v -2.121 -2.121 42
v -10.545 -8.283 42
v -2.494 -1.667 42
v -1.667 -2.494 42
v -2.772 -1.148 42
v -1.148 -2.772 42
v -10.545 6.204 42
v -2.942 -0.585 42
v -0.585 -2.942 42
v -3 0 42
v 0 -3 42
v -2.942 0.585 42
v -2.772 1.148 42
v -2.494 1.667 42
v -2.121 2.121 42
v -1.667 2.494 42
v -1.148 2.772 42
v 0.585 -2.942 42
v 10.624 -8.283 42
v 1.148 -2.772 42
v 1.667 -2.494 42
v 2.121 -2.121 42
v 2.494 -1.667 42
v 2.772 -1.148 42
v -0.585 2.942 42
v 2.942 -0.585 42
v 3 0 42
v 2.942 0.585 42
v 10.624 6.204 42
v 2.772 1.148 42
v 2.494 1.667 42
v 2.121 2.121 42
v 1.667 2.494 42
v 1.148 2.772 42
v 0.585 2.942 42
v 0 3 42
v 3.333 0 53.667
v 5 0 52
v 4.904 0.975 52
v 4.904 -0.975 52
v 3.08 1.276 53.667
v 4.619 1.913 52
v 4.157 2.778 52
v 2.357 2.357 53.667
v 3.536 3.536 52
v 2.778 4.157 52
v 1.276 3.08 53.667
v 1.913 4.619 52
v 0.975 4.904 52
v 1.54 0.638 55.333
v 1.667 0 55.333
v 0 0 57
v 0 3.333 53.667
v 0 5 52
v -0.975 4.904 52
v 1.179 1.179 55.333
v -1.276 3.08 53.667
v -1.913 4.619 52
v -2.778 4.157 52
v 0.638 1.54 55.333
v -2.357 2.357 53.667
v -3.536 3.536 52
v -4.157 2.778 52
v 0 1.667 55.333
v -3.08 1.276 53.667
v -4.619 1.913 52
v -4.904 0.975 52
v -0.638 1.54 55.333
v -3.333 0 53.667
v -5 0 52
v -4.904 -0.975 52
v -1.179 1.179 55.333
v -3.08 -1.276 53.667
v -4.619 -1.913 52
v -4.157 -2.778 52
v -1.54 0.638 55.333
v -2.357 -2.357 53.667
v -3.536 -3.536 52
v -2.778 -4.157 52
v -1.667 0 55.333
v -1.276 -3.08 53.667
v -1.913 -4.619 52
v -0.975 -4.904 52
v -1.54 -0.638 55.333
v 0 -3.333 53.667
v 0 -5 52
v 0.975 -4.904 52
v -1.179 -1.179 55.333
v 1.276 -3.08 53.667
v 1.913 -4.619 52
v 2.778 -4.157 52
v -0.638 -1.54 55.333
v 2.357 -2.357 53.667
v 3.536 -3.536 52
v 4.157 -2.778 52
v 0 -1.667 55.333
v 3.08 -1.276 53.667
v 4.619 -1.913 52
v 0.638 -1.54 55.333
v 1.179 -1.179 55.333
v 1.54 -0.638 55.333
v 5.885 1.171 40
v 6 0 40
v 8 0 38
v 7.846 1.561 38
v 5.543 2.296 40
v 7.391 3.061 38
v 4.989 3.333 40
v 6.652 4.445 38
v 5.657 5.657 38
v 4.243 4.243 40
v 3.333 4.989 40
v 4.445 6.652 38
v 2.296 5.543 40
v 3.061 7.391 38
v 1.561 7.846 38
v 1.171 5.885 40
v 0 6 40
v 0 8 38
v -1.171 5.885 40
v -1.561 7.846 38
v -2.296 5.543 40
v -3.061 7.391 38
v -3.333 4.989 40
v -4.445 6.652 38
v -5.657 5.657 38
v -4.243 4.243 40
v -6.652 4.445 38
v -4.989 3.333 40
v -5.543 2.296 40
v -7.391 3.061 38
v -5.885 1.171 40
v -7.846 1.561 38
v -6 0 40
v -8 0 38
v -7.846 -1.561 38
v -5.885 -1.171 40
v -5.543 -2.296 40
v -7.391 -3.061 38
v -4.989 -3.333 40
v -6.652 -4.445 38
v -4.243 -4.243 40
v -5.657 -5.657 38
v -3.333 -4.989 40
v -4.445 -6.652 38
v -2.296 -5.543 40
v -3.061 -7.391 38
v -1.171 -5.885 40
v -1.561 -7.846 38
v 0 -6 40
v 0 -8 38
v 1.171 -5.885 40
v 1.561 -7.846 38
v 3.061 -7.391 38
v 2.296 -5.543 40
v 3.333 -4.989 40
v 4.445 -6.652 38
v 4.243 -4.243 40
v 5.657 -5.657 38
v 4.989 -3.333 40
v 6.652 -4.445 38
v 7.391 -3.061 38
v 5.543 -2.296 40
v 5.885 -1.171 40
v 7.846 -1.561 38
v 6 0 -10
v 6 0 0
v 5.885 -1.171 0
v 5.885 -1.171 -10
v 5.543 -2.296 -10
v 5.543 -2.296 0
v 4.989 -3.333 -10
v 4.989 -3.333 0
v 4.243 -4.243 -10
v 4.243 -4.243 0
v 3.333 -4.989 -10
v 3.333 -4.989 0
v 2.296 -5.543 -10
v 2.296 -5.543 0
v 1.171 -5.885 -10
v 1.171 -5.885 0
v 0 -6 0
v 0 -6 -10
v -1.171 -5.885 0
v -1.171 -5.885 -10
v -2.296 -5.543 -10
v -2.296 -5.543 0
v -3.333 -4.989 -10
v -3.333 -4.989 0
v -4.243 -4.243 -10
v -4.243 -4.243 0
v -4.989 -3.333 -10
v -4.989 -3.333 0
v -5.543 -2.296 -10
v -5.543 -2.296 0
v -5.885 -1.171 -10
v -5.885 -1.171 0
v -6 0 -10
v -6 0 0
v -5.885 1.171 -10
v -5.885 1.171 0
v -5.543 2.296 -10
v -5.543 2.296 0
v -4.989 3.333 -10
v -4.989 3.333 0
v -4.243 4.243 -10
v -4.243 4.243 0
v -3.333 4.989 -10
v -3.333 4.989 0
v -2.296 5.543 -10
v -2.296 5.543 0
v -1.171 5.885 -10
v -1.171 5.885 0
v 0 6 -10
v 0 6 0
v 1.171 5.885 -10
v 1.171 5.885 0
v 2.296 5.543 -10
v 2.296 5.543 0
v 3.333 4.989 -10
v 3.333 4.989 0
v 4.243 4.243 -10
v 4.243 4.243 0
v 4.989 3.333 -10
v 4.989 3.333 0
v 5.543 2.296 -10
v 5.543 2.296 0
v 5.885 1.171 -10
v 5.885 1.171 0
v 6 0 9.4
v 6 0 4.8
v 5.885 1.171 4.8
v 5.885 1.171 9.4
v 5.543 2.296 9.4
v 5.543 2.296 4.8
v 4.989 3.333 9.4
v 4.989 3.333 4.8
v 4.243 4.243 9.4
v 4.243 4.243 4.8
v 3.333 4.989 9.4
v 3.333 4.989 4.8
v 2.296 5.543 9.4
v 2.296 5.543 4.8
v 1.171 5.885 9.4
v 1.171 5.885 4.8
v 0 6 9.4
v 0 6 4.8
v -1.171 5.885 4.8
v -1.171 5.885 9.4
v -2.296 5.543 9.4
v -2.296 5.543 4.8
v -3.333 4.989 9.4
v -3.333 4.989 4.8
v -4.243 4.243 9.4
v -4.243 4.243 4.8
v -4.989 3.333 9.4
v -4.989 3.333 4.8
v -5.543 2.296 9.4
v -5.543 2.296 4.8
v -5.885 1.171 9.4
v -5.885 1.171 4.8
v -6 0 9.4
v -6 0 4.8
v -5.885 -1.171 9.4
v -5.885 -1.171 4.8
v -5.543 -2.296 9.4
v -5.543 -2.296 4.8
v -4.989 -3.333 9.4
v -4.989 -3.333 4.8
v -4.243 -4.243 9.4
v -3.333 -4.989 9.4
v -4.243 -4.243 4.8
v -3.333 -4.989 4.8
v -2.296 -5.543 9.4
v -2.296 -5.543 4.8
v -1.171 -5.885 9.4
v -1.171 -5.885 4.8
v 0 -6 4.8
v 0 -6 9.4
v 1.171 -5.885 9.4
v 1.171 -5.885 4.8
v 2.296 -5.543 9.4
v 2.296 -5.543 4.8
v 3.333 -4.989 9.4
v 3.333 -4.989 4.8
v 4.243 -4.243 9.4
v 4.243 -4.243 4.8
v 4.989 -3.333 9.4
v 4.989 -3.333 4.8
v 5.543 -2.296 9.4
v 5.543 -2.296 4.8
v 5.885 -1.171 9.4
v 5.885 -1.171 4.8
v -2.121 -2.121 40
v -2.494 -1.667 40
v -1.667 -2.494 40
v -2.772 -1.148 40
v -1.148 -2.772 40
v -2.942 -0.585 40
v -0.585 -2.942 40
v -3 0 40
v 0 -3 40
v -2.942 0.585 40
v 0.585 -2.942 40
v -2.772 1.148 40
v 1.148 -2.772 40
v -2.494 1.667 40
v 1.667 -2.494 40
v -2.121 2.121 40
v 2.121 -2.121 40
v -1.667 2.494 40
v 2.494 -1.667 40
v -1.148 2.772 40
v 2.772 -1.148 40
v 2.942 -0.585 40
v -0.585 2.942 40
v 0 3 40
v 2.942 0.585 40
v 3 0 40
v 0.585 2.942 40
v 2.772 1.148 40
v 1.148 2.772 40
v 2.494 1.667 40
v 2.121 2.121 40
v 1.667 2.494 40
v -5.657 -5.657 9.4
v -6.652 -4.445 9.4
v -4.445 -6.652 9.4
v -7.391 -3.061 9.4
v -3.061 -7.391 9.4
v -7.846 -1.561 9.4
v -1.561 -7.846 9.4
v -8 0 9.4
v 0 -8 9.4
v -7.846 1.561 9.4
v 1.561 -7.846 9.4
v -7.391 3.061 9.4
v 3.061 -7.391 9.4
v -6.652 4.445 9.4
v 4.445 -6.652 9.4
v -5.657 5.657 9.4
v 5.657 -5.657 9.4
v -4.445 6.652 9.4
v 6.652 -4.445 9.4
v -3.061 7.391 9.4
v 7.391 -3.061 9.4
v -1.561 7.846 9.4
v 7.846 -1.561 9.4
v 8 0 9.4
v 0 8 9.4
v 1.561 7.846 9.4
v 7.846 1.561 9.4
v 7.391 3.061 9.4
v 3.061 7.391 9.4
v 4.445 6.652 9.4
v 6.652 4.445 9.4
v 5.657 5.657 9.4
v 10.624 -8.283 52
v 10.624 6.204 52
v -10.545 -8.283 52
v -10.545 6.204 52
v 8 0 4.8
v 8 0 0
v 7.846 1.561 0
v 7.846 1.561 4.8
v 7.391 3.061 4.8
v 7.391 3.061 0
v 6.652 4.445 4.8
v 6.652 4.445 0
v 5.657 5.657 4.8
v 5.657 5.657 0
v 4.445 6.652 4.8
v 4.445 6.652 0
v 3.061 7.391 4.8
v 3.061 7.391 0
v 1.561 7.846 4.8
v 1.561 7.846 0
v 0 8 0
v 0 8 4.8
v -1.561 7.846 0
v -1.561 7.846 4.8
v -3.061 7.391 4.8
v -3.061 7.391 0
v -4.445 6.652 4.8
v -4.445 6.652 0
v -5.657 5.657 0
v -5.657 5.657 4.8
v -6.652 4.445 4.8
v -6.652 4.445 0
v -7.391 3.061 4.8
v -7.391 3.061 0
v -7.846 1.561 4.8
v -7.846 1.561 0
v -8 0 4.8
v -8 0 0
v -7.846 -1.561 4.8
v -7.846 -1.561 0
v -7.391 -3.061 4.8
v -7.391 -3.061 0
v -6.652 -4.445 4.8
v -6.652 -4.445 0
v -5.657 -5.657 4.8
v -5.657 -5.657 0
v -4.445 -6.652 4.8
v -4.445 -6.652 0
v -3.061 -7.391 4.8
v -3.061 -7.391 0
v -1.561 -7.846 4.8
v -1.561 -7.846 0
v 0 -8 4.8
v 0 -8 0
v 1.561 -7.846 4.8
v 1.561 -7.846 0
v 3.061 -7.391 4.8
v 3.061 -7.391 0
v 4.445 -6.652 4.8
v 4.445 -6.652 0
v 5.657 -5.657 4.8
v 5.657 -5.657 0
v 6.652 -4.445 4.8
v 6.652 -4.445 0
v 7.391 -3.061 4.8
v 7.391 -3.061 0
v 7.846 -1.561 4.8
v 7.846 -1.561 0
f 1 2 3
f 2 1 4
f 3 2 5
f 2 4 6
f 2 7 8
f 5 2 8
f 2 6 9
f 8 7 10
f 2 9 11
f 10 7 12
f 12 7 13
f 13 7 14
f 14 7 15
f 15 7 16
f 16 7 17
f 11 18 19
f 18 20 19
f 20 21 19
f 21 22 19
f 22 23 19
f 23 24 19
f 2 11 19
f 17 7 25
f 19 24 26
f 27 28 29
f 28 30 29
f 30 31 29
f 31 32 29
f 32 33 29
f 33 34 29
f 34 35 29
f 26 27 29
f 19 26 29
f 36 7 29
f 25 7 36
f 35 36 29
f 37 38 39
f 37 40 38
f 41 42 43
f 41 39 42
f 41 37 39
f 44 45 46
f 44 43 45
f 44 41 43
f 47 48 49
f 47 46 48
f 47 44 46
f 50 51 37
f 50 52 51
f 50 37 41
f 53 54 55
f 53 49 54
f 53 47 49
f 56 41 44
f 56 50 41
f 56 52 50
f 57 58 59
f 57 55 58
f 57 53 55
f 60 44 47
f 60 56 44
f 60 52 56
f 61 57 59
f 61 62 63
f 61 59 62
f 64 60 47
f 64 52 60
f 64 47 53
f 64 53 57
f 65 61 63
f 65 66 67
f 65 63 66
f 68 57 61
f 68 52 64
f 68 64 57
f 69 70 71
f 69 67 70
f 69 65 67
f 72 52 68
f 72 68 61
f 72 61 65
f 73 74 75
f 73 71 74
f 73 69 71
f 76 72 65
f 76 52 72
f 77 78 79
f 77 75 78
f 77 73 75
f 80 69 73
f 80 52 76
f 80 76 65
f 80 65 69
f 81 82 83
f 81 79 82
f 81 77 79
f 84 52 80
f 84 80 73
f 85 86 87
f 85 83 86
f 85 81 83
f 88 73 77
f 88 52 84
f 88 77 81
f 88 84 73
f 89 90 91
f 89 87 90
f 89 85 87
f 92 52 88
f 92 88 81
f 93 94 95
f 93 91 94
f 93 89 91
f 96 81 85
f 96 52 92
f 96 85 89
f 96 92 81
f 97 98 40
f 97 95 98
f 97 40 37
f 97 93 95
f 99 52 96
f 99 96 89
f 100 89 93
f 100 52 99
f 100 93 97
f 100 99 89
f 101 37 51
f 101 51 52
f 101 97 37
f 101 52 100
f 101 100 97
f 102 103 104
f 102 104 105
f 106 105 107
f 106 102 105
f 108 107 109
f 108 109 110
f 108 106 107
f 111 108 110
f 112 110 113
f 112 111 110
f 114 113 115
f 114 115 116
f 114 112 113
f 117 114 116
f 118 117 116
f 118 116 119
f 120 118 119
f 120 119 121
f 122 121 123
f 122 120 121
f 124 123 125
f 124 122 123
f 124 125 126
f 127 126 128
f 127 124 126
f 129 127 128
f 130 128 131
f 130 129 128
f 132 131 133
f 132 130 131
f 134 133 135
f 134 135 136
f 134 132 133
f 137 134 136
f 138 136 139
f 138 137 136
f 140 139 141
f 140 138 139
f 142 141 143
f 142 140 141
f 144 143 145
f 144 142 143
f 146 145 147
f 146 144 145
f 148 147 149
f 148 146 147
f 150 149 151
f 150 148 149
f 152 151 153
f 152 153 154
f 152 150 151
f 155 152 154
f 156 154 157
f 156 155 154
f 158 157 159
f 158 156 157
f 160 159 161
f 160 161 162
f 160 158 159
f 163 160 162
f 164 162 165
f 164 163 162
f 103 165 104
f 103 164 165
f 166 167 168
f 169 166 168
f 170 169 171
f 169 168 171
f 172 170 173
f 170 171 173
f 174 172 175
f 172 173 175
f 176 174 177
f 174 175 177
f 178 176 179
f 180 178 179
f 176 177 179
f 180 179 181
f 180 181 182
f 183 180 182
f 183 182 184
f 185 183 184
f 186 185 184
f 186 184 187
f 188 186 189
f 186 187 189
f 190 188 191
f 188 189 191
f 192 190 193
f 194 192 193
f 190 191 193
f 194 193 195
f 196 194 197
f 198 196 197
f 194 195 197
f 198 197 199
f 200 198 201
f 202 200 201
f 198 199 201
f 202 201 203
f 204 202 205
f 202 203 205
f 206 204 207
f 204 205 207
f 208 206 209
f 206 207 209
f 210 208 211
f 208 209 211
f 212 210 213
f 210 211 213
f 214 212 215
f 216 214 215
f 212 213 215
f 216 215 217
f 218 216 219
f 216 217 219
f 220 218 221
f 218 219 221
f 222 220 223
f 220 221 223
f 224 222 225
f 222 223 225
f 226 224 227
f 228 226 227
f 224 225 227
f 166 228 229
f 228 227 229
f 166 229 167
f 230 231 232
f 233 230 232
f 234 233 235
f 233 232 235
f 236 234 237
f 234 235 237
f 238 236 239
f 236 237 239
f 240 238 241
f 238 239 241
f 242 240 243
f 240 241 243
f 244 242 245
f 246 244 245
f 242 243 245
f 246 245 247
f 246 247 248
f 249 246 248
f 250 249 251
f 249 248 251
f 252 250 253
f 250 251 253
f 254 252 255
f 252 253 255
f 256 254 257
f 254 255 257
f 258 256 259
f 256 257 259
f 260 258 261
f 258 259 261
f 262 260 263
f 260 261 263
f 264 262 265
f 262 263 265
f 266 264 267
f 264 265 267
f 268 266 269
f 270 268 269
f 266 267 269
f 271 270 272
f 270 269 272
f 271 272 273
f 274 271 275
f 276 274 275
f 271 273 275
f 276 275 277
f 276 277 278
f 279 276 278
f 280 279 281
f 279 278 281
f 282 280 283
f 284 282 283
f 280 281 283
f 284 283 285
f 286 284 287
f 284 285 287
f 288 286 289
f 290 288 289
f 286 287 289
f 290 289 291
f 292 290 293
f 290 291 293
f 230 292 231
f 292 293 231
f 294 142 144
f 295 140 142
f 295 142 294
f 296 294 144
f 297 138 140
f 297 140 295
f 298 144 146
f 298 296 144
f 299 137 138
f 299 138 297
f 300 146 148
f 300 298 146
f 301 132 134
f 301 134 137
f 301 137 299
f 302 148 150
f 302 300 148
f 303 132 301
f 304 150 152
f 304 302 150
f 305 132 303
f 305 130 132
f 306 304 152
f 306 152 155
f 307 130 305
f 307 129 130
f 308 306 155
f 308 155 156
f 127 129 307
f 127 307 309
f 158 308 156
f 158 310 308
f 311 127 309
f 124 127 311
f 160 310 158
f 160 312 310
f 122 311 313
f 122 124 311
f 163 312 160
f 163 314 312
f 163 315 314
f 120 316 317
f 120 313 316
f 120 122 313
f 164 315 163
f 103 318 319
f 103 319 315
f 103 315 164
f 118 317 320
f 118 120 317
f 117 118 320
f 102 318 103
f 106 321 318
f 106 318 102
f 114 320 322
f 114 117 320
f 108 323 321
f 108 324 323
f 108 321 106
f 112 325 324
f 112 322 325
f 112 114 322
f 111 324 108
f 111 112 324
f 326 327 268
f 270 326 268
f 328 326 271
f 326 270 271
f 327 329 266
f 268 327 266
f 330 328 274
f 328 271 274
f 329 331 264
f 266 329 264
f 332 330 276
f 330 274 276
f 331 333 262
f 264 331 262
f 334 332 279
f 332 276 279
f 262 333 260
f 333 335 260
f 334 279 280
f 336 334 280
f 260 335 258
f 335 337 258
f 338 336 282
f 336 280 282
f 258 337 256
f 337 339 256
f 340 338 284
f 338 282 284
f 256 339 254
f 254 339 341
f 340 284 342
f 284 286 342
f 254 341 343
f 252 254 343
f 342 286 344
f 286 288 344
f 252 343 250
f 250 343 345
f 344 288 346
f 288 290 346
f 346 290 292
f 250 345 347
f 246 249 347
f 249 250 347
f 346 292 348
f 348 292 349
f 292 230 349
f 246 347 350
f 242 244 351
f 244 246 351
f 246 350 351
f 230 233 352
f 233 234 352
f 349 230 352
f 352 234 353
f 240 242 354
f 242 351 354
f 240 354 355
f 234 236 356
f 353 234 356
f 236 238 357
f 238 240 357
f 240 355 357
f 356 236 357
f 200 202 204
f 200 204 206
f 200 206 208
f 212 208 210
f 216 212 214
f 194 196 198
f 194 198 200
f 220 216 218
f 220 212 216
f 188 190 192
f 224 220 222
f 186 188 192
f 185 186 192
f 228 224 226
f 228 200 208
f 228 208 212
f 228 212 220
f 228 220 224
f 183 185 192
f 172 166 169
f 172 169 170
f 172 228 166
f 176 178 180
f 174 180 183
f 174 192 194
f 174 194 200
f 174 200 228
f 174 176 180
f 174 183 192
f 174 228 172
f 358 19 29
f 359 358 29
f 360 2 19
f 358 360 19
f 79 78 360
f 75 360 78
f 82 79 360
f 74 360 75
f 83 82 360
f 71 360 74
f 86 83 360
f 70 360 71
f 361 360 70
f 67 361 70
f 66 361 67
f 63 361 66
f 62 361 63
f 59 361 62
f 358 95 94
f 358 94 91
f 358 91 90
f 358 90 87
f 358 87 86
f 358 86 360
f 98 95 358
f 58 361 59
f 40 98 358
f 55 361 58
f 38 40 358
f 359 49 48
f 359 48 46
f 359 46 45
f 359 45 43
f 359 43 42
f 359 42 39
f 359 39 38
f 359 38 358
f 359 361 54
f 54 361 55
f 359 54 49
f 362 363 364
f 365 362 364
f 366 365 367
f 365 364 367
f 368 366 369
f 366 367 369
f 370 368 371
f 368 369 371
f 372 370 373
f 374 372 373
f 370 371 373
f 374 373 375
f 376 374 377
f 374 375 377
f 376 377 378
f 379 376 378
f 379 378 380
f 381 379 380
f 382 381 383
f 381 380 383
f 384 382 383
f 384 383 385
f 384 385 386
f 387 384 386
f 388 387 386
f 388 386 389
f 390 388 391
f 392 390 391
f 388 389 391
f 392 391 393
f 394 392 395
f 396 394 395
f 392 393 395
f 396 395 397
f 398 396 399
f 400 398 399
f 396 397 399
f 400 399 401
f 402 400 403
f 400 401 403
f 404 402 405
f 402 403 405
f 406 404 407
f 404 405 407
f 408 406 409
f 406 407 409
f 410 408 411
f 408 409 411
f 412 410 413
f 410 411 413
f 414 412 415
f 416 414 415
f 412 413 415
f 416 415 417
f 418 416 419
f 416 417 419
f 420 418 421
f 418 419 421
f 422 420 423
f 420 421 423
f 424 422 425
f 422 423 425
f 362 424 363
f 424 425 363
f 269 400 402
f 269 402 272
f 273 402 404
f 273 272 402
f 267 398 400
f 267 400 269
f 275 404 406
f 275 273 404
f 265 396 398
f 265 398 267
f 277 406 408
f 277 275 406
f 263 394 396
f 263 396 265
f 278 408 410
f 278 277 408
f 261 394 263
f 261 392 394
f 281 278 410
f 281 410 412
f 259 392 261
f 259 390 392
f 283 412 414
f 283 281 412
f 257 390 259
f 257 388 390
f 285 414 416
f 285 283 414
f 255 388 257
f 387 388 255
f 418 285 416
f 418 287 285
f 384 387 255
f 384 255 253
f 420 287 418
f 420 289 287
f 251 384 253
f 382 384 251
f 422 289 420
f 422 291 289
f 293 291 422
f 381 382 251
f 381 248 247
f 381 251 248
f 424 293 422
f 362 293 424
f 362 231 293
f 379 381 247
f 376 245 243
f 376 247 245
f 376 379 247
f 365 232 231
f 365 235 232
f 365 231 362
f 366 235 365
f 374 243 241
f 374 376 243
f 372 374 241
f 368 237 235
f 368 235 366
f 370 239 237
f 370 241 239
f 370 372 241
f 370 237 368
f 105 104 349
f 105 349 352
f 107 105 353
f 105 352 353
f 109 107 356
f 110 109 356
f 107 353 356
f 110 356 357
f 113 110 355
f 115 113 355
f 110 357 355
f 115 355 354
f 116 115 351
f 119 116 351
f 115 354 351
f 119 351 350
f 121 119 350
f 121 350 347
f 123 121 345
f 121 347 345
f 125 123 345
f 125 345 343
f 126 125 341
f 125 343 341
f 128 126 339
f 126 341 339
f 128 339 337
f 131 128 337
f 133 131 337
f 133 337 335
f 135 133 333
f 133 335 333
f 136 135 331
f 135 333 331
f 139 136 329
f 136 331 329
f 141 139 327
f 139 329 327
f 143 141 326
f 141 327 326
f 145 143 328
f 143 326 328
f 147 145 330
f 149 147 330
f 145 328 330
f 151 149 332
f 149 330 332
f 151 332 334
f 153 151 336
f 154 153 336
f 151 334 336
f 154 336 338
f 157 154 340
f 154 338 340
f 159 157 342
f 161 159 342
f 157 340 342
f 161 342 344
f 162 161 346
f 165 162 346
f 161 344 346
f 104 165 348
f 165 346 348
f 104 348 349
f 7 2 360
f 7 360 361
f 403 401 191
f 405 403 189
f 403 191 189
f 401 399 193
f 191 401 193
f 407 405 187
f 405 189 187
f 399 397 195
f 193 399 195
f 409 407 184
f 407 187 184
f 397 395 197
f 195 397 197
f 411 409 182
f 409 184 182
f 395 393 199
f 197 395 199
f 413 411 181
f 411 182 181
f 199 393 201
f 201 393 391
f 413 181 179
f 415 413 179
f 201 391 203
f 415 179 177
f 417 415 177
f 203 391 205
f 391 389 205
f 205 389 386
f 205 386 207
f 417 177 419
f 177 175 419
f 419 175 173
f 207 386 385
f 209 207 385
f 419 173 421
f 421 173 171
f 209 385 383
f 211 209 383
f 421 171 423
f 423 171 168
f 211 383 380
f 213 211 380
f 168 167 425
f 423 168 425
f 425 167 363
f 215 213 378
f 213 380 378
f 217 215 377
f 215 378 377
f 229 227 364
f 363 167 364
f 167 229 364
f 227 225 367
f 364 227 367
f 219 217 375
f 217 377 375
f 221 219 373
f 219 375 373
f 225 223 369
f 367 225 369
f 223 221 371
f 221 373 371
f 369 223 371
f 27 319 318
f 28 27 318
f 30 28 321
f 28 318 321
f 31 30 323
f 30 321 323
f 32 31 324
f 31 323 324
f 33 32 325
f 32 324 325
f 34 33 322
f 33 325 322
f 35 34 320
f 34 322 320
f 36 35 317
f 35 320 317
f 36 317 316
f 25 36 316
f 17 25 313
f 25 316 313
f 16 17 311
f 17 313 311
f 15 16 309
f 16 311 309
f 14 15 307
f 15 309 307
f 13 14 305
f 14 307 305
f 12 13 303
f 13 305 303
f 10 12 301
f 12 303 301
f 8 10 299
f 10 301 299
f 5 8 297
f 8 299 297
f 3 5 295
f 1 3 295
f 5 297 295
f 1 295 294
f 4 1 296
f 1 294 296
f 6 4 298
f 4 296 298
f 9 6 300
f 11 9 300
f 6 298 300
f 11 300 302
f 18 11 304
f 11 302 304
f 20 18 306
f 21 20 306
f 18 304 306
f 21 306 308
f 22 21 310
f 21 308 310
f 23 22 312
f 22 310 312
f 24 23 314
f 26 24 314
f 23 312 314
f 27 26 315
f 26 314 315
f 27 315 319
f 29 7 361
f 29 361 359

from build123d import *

# Parameters (mm, degrees)
F0_R      = 8
F1_DEPTH  = 4.8
F2_R      = 6
F3_DEPTH  = 4.6
F4_R      = 8
F5_DEPTH  = 30.6
F6_SIZE   = 2
F7_R      = 3
F8_DEPTH  = 2
F9_W      = 21.1684573442
F9_H      = 14.4873037934
F10_DEPTH = 10
F11_R     = 5
F12_DEPTH = 5
F12_TAPER = 45
F13_R     = 6
F14_DEPTH = 10


with BuildPart() as f1:
    # F0 (on Top) → F1 (new body)
    with BuildSketch(Plane.XY):
        Circle(F0_R)
    extrude(amount=F1_DEPTH)

    # F2 (on face) → F3 (join)
    with BuildSketch(Plane.XY.offset(4.8)):
        Circle(F2_R)
    extrude(amount=F3_DEPTH)

    # F4 (on face) → F5 (join)
    with BuildSketch(Plane.XY.offset(9.4)):
        Circle(F4_R)
    extrude(amount=F5_DEPTH)

    # F6
    f6_edges = [f1.edges().sort_by_distance(p)[0] for p in [
        (-8, 0, 40),
    ]]
    chamfer(f6_edges, length=F6_SIZE)

    # F7 (on face) → F8 (join)
    with BuildSketch(Plane.XY.offset(40)):
        Circle(F7_R)
    extrude(amount=F8_DEPTH)

    # F9 (on face) → F10 (join)
    with BuildSketch(Plane.XY.offset(42)):
        with Locations((0.0396473333, -1.0394603014)):
            Rectangle(F9_W, F9_H)
    extrude(amount=F10_DEPTH)

    # F11 (on face) → F12 (join)
    with BuildSketch(Plane.XY.offset(52)):
        Circle(F11_R)
    extrude(amount=F12_DEPTH, taper=F12_TAPER)

    # F13 (on face) → F14 (join)
    with BuildSketch(Plane(origin=(0, 0, 0), x_dir=(1, 0, 0), z_dir=(0, 0, -1))):
        Circle(F13_R)
    extrude(amount=F14_DEPTH)


solid = f1.part
